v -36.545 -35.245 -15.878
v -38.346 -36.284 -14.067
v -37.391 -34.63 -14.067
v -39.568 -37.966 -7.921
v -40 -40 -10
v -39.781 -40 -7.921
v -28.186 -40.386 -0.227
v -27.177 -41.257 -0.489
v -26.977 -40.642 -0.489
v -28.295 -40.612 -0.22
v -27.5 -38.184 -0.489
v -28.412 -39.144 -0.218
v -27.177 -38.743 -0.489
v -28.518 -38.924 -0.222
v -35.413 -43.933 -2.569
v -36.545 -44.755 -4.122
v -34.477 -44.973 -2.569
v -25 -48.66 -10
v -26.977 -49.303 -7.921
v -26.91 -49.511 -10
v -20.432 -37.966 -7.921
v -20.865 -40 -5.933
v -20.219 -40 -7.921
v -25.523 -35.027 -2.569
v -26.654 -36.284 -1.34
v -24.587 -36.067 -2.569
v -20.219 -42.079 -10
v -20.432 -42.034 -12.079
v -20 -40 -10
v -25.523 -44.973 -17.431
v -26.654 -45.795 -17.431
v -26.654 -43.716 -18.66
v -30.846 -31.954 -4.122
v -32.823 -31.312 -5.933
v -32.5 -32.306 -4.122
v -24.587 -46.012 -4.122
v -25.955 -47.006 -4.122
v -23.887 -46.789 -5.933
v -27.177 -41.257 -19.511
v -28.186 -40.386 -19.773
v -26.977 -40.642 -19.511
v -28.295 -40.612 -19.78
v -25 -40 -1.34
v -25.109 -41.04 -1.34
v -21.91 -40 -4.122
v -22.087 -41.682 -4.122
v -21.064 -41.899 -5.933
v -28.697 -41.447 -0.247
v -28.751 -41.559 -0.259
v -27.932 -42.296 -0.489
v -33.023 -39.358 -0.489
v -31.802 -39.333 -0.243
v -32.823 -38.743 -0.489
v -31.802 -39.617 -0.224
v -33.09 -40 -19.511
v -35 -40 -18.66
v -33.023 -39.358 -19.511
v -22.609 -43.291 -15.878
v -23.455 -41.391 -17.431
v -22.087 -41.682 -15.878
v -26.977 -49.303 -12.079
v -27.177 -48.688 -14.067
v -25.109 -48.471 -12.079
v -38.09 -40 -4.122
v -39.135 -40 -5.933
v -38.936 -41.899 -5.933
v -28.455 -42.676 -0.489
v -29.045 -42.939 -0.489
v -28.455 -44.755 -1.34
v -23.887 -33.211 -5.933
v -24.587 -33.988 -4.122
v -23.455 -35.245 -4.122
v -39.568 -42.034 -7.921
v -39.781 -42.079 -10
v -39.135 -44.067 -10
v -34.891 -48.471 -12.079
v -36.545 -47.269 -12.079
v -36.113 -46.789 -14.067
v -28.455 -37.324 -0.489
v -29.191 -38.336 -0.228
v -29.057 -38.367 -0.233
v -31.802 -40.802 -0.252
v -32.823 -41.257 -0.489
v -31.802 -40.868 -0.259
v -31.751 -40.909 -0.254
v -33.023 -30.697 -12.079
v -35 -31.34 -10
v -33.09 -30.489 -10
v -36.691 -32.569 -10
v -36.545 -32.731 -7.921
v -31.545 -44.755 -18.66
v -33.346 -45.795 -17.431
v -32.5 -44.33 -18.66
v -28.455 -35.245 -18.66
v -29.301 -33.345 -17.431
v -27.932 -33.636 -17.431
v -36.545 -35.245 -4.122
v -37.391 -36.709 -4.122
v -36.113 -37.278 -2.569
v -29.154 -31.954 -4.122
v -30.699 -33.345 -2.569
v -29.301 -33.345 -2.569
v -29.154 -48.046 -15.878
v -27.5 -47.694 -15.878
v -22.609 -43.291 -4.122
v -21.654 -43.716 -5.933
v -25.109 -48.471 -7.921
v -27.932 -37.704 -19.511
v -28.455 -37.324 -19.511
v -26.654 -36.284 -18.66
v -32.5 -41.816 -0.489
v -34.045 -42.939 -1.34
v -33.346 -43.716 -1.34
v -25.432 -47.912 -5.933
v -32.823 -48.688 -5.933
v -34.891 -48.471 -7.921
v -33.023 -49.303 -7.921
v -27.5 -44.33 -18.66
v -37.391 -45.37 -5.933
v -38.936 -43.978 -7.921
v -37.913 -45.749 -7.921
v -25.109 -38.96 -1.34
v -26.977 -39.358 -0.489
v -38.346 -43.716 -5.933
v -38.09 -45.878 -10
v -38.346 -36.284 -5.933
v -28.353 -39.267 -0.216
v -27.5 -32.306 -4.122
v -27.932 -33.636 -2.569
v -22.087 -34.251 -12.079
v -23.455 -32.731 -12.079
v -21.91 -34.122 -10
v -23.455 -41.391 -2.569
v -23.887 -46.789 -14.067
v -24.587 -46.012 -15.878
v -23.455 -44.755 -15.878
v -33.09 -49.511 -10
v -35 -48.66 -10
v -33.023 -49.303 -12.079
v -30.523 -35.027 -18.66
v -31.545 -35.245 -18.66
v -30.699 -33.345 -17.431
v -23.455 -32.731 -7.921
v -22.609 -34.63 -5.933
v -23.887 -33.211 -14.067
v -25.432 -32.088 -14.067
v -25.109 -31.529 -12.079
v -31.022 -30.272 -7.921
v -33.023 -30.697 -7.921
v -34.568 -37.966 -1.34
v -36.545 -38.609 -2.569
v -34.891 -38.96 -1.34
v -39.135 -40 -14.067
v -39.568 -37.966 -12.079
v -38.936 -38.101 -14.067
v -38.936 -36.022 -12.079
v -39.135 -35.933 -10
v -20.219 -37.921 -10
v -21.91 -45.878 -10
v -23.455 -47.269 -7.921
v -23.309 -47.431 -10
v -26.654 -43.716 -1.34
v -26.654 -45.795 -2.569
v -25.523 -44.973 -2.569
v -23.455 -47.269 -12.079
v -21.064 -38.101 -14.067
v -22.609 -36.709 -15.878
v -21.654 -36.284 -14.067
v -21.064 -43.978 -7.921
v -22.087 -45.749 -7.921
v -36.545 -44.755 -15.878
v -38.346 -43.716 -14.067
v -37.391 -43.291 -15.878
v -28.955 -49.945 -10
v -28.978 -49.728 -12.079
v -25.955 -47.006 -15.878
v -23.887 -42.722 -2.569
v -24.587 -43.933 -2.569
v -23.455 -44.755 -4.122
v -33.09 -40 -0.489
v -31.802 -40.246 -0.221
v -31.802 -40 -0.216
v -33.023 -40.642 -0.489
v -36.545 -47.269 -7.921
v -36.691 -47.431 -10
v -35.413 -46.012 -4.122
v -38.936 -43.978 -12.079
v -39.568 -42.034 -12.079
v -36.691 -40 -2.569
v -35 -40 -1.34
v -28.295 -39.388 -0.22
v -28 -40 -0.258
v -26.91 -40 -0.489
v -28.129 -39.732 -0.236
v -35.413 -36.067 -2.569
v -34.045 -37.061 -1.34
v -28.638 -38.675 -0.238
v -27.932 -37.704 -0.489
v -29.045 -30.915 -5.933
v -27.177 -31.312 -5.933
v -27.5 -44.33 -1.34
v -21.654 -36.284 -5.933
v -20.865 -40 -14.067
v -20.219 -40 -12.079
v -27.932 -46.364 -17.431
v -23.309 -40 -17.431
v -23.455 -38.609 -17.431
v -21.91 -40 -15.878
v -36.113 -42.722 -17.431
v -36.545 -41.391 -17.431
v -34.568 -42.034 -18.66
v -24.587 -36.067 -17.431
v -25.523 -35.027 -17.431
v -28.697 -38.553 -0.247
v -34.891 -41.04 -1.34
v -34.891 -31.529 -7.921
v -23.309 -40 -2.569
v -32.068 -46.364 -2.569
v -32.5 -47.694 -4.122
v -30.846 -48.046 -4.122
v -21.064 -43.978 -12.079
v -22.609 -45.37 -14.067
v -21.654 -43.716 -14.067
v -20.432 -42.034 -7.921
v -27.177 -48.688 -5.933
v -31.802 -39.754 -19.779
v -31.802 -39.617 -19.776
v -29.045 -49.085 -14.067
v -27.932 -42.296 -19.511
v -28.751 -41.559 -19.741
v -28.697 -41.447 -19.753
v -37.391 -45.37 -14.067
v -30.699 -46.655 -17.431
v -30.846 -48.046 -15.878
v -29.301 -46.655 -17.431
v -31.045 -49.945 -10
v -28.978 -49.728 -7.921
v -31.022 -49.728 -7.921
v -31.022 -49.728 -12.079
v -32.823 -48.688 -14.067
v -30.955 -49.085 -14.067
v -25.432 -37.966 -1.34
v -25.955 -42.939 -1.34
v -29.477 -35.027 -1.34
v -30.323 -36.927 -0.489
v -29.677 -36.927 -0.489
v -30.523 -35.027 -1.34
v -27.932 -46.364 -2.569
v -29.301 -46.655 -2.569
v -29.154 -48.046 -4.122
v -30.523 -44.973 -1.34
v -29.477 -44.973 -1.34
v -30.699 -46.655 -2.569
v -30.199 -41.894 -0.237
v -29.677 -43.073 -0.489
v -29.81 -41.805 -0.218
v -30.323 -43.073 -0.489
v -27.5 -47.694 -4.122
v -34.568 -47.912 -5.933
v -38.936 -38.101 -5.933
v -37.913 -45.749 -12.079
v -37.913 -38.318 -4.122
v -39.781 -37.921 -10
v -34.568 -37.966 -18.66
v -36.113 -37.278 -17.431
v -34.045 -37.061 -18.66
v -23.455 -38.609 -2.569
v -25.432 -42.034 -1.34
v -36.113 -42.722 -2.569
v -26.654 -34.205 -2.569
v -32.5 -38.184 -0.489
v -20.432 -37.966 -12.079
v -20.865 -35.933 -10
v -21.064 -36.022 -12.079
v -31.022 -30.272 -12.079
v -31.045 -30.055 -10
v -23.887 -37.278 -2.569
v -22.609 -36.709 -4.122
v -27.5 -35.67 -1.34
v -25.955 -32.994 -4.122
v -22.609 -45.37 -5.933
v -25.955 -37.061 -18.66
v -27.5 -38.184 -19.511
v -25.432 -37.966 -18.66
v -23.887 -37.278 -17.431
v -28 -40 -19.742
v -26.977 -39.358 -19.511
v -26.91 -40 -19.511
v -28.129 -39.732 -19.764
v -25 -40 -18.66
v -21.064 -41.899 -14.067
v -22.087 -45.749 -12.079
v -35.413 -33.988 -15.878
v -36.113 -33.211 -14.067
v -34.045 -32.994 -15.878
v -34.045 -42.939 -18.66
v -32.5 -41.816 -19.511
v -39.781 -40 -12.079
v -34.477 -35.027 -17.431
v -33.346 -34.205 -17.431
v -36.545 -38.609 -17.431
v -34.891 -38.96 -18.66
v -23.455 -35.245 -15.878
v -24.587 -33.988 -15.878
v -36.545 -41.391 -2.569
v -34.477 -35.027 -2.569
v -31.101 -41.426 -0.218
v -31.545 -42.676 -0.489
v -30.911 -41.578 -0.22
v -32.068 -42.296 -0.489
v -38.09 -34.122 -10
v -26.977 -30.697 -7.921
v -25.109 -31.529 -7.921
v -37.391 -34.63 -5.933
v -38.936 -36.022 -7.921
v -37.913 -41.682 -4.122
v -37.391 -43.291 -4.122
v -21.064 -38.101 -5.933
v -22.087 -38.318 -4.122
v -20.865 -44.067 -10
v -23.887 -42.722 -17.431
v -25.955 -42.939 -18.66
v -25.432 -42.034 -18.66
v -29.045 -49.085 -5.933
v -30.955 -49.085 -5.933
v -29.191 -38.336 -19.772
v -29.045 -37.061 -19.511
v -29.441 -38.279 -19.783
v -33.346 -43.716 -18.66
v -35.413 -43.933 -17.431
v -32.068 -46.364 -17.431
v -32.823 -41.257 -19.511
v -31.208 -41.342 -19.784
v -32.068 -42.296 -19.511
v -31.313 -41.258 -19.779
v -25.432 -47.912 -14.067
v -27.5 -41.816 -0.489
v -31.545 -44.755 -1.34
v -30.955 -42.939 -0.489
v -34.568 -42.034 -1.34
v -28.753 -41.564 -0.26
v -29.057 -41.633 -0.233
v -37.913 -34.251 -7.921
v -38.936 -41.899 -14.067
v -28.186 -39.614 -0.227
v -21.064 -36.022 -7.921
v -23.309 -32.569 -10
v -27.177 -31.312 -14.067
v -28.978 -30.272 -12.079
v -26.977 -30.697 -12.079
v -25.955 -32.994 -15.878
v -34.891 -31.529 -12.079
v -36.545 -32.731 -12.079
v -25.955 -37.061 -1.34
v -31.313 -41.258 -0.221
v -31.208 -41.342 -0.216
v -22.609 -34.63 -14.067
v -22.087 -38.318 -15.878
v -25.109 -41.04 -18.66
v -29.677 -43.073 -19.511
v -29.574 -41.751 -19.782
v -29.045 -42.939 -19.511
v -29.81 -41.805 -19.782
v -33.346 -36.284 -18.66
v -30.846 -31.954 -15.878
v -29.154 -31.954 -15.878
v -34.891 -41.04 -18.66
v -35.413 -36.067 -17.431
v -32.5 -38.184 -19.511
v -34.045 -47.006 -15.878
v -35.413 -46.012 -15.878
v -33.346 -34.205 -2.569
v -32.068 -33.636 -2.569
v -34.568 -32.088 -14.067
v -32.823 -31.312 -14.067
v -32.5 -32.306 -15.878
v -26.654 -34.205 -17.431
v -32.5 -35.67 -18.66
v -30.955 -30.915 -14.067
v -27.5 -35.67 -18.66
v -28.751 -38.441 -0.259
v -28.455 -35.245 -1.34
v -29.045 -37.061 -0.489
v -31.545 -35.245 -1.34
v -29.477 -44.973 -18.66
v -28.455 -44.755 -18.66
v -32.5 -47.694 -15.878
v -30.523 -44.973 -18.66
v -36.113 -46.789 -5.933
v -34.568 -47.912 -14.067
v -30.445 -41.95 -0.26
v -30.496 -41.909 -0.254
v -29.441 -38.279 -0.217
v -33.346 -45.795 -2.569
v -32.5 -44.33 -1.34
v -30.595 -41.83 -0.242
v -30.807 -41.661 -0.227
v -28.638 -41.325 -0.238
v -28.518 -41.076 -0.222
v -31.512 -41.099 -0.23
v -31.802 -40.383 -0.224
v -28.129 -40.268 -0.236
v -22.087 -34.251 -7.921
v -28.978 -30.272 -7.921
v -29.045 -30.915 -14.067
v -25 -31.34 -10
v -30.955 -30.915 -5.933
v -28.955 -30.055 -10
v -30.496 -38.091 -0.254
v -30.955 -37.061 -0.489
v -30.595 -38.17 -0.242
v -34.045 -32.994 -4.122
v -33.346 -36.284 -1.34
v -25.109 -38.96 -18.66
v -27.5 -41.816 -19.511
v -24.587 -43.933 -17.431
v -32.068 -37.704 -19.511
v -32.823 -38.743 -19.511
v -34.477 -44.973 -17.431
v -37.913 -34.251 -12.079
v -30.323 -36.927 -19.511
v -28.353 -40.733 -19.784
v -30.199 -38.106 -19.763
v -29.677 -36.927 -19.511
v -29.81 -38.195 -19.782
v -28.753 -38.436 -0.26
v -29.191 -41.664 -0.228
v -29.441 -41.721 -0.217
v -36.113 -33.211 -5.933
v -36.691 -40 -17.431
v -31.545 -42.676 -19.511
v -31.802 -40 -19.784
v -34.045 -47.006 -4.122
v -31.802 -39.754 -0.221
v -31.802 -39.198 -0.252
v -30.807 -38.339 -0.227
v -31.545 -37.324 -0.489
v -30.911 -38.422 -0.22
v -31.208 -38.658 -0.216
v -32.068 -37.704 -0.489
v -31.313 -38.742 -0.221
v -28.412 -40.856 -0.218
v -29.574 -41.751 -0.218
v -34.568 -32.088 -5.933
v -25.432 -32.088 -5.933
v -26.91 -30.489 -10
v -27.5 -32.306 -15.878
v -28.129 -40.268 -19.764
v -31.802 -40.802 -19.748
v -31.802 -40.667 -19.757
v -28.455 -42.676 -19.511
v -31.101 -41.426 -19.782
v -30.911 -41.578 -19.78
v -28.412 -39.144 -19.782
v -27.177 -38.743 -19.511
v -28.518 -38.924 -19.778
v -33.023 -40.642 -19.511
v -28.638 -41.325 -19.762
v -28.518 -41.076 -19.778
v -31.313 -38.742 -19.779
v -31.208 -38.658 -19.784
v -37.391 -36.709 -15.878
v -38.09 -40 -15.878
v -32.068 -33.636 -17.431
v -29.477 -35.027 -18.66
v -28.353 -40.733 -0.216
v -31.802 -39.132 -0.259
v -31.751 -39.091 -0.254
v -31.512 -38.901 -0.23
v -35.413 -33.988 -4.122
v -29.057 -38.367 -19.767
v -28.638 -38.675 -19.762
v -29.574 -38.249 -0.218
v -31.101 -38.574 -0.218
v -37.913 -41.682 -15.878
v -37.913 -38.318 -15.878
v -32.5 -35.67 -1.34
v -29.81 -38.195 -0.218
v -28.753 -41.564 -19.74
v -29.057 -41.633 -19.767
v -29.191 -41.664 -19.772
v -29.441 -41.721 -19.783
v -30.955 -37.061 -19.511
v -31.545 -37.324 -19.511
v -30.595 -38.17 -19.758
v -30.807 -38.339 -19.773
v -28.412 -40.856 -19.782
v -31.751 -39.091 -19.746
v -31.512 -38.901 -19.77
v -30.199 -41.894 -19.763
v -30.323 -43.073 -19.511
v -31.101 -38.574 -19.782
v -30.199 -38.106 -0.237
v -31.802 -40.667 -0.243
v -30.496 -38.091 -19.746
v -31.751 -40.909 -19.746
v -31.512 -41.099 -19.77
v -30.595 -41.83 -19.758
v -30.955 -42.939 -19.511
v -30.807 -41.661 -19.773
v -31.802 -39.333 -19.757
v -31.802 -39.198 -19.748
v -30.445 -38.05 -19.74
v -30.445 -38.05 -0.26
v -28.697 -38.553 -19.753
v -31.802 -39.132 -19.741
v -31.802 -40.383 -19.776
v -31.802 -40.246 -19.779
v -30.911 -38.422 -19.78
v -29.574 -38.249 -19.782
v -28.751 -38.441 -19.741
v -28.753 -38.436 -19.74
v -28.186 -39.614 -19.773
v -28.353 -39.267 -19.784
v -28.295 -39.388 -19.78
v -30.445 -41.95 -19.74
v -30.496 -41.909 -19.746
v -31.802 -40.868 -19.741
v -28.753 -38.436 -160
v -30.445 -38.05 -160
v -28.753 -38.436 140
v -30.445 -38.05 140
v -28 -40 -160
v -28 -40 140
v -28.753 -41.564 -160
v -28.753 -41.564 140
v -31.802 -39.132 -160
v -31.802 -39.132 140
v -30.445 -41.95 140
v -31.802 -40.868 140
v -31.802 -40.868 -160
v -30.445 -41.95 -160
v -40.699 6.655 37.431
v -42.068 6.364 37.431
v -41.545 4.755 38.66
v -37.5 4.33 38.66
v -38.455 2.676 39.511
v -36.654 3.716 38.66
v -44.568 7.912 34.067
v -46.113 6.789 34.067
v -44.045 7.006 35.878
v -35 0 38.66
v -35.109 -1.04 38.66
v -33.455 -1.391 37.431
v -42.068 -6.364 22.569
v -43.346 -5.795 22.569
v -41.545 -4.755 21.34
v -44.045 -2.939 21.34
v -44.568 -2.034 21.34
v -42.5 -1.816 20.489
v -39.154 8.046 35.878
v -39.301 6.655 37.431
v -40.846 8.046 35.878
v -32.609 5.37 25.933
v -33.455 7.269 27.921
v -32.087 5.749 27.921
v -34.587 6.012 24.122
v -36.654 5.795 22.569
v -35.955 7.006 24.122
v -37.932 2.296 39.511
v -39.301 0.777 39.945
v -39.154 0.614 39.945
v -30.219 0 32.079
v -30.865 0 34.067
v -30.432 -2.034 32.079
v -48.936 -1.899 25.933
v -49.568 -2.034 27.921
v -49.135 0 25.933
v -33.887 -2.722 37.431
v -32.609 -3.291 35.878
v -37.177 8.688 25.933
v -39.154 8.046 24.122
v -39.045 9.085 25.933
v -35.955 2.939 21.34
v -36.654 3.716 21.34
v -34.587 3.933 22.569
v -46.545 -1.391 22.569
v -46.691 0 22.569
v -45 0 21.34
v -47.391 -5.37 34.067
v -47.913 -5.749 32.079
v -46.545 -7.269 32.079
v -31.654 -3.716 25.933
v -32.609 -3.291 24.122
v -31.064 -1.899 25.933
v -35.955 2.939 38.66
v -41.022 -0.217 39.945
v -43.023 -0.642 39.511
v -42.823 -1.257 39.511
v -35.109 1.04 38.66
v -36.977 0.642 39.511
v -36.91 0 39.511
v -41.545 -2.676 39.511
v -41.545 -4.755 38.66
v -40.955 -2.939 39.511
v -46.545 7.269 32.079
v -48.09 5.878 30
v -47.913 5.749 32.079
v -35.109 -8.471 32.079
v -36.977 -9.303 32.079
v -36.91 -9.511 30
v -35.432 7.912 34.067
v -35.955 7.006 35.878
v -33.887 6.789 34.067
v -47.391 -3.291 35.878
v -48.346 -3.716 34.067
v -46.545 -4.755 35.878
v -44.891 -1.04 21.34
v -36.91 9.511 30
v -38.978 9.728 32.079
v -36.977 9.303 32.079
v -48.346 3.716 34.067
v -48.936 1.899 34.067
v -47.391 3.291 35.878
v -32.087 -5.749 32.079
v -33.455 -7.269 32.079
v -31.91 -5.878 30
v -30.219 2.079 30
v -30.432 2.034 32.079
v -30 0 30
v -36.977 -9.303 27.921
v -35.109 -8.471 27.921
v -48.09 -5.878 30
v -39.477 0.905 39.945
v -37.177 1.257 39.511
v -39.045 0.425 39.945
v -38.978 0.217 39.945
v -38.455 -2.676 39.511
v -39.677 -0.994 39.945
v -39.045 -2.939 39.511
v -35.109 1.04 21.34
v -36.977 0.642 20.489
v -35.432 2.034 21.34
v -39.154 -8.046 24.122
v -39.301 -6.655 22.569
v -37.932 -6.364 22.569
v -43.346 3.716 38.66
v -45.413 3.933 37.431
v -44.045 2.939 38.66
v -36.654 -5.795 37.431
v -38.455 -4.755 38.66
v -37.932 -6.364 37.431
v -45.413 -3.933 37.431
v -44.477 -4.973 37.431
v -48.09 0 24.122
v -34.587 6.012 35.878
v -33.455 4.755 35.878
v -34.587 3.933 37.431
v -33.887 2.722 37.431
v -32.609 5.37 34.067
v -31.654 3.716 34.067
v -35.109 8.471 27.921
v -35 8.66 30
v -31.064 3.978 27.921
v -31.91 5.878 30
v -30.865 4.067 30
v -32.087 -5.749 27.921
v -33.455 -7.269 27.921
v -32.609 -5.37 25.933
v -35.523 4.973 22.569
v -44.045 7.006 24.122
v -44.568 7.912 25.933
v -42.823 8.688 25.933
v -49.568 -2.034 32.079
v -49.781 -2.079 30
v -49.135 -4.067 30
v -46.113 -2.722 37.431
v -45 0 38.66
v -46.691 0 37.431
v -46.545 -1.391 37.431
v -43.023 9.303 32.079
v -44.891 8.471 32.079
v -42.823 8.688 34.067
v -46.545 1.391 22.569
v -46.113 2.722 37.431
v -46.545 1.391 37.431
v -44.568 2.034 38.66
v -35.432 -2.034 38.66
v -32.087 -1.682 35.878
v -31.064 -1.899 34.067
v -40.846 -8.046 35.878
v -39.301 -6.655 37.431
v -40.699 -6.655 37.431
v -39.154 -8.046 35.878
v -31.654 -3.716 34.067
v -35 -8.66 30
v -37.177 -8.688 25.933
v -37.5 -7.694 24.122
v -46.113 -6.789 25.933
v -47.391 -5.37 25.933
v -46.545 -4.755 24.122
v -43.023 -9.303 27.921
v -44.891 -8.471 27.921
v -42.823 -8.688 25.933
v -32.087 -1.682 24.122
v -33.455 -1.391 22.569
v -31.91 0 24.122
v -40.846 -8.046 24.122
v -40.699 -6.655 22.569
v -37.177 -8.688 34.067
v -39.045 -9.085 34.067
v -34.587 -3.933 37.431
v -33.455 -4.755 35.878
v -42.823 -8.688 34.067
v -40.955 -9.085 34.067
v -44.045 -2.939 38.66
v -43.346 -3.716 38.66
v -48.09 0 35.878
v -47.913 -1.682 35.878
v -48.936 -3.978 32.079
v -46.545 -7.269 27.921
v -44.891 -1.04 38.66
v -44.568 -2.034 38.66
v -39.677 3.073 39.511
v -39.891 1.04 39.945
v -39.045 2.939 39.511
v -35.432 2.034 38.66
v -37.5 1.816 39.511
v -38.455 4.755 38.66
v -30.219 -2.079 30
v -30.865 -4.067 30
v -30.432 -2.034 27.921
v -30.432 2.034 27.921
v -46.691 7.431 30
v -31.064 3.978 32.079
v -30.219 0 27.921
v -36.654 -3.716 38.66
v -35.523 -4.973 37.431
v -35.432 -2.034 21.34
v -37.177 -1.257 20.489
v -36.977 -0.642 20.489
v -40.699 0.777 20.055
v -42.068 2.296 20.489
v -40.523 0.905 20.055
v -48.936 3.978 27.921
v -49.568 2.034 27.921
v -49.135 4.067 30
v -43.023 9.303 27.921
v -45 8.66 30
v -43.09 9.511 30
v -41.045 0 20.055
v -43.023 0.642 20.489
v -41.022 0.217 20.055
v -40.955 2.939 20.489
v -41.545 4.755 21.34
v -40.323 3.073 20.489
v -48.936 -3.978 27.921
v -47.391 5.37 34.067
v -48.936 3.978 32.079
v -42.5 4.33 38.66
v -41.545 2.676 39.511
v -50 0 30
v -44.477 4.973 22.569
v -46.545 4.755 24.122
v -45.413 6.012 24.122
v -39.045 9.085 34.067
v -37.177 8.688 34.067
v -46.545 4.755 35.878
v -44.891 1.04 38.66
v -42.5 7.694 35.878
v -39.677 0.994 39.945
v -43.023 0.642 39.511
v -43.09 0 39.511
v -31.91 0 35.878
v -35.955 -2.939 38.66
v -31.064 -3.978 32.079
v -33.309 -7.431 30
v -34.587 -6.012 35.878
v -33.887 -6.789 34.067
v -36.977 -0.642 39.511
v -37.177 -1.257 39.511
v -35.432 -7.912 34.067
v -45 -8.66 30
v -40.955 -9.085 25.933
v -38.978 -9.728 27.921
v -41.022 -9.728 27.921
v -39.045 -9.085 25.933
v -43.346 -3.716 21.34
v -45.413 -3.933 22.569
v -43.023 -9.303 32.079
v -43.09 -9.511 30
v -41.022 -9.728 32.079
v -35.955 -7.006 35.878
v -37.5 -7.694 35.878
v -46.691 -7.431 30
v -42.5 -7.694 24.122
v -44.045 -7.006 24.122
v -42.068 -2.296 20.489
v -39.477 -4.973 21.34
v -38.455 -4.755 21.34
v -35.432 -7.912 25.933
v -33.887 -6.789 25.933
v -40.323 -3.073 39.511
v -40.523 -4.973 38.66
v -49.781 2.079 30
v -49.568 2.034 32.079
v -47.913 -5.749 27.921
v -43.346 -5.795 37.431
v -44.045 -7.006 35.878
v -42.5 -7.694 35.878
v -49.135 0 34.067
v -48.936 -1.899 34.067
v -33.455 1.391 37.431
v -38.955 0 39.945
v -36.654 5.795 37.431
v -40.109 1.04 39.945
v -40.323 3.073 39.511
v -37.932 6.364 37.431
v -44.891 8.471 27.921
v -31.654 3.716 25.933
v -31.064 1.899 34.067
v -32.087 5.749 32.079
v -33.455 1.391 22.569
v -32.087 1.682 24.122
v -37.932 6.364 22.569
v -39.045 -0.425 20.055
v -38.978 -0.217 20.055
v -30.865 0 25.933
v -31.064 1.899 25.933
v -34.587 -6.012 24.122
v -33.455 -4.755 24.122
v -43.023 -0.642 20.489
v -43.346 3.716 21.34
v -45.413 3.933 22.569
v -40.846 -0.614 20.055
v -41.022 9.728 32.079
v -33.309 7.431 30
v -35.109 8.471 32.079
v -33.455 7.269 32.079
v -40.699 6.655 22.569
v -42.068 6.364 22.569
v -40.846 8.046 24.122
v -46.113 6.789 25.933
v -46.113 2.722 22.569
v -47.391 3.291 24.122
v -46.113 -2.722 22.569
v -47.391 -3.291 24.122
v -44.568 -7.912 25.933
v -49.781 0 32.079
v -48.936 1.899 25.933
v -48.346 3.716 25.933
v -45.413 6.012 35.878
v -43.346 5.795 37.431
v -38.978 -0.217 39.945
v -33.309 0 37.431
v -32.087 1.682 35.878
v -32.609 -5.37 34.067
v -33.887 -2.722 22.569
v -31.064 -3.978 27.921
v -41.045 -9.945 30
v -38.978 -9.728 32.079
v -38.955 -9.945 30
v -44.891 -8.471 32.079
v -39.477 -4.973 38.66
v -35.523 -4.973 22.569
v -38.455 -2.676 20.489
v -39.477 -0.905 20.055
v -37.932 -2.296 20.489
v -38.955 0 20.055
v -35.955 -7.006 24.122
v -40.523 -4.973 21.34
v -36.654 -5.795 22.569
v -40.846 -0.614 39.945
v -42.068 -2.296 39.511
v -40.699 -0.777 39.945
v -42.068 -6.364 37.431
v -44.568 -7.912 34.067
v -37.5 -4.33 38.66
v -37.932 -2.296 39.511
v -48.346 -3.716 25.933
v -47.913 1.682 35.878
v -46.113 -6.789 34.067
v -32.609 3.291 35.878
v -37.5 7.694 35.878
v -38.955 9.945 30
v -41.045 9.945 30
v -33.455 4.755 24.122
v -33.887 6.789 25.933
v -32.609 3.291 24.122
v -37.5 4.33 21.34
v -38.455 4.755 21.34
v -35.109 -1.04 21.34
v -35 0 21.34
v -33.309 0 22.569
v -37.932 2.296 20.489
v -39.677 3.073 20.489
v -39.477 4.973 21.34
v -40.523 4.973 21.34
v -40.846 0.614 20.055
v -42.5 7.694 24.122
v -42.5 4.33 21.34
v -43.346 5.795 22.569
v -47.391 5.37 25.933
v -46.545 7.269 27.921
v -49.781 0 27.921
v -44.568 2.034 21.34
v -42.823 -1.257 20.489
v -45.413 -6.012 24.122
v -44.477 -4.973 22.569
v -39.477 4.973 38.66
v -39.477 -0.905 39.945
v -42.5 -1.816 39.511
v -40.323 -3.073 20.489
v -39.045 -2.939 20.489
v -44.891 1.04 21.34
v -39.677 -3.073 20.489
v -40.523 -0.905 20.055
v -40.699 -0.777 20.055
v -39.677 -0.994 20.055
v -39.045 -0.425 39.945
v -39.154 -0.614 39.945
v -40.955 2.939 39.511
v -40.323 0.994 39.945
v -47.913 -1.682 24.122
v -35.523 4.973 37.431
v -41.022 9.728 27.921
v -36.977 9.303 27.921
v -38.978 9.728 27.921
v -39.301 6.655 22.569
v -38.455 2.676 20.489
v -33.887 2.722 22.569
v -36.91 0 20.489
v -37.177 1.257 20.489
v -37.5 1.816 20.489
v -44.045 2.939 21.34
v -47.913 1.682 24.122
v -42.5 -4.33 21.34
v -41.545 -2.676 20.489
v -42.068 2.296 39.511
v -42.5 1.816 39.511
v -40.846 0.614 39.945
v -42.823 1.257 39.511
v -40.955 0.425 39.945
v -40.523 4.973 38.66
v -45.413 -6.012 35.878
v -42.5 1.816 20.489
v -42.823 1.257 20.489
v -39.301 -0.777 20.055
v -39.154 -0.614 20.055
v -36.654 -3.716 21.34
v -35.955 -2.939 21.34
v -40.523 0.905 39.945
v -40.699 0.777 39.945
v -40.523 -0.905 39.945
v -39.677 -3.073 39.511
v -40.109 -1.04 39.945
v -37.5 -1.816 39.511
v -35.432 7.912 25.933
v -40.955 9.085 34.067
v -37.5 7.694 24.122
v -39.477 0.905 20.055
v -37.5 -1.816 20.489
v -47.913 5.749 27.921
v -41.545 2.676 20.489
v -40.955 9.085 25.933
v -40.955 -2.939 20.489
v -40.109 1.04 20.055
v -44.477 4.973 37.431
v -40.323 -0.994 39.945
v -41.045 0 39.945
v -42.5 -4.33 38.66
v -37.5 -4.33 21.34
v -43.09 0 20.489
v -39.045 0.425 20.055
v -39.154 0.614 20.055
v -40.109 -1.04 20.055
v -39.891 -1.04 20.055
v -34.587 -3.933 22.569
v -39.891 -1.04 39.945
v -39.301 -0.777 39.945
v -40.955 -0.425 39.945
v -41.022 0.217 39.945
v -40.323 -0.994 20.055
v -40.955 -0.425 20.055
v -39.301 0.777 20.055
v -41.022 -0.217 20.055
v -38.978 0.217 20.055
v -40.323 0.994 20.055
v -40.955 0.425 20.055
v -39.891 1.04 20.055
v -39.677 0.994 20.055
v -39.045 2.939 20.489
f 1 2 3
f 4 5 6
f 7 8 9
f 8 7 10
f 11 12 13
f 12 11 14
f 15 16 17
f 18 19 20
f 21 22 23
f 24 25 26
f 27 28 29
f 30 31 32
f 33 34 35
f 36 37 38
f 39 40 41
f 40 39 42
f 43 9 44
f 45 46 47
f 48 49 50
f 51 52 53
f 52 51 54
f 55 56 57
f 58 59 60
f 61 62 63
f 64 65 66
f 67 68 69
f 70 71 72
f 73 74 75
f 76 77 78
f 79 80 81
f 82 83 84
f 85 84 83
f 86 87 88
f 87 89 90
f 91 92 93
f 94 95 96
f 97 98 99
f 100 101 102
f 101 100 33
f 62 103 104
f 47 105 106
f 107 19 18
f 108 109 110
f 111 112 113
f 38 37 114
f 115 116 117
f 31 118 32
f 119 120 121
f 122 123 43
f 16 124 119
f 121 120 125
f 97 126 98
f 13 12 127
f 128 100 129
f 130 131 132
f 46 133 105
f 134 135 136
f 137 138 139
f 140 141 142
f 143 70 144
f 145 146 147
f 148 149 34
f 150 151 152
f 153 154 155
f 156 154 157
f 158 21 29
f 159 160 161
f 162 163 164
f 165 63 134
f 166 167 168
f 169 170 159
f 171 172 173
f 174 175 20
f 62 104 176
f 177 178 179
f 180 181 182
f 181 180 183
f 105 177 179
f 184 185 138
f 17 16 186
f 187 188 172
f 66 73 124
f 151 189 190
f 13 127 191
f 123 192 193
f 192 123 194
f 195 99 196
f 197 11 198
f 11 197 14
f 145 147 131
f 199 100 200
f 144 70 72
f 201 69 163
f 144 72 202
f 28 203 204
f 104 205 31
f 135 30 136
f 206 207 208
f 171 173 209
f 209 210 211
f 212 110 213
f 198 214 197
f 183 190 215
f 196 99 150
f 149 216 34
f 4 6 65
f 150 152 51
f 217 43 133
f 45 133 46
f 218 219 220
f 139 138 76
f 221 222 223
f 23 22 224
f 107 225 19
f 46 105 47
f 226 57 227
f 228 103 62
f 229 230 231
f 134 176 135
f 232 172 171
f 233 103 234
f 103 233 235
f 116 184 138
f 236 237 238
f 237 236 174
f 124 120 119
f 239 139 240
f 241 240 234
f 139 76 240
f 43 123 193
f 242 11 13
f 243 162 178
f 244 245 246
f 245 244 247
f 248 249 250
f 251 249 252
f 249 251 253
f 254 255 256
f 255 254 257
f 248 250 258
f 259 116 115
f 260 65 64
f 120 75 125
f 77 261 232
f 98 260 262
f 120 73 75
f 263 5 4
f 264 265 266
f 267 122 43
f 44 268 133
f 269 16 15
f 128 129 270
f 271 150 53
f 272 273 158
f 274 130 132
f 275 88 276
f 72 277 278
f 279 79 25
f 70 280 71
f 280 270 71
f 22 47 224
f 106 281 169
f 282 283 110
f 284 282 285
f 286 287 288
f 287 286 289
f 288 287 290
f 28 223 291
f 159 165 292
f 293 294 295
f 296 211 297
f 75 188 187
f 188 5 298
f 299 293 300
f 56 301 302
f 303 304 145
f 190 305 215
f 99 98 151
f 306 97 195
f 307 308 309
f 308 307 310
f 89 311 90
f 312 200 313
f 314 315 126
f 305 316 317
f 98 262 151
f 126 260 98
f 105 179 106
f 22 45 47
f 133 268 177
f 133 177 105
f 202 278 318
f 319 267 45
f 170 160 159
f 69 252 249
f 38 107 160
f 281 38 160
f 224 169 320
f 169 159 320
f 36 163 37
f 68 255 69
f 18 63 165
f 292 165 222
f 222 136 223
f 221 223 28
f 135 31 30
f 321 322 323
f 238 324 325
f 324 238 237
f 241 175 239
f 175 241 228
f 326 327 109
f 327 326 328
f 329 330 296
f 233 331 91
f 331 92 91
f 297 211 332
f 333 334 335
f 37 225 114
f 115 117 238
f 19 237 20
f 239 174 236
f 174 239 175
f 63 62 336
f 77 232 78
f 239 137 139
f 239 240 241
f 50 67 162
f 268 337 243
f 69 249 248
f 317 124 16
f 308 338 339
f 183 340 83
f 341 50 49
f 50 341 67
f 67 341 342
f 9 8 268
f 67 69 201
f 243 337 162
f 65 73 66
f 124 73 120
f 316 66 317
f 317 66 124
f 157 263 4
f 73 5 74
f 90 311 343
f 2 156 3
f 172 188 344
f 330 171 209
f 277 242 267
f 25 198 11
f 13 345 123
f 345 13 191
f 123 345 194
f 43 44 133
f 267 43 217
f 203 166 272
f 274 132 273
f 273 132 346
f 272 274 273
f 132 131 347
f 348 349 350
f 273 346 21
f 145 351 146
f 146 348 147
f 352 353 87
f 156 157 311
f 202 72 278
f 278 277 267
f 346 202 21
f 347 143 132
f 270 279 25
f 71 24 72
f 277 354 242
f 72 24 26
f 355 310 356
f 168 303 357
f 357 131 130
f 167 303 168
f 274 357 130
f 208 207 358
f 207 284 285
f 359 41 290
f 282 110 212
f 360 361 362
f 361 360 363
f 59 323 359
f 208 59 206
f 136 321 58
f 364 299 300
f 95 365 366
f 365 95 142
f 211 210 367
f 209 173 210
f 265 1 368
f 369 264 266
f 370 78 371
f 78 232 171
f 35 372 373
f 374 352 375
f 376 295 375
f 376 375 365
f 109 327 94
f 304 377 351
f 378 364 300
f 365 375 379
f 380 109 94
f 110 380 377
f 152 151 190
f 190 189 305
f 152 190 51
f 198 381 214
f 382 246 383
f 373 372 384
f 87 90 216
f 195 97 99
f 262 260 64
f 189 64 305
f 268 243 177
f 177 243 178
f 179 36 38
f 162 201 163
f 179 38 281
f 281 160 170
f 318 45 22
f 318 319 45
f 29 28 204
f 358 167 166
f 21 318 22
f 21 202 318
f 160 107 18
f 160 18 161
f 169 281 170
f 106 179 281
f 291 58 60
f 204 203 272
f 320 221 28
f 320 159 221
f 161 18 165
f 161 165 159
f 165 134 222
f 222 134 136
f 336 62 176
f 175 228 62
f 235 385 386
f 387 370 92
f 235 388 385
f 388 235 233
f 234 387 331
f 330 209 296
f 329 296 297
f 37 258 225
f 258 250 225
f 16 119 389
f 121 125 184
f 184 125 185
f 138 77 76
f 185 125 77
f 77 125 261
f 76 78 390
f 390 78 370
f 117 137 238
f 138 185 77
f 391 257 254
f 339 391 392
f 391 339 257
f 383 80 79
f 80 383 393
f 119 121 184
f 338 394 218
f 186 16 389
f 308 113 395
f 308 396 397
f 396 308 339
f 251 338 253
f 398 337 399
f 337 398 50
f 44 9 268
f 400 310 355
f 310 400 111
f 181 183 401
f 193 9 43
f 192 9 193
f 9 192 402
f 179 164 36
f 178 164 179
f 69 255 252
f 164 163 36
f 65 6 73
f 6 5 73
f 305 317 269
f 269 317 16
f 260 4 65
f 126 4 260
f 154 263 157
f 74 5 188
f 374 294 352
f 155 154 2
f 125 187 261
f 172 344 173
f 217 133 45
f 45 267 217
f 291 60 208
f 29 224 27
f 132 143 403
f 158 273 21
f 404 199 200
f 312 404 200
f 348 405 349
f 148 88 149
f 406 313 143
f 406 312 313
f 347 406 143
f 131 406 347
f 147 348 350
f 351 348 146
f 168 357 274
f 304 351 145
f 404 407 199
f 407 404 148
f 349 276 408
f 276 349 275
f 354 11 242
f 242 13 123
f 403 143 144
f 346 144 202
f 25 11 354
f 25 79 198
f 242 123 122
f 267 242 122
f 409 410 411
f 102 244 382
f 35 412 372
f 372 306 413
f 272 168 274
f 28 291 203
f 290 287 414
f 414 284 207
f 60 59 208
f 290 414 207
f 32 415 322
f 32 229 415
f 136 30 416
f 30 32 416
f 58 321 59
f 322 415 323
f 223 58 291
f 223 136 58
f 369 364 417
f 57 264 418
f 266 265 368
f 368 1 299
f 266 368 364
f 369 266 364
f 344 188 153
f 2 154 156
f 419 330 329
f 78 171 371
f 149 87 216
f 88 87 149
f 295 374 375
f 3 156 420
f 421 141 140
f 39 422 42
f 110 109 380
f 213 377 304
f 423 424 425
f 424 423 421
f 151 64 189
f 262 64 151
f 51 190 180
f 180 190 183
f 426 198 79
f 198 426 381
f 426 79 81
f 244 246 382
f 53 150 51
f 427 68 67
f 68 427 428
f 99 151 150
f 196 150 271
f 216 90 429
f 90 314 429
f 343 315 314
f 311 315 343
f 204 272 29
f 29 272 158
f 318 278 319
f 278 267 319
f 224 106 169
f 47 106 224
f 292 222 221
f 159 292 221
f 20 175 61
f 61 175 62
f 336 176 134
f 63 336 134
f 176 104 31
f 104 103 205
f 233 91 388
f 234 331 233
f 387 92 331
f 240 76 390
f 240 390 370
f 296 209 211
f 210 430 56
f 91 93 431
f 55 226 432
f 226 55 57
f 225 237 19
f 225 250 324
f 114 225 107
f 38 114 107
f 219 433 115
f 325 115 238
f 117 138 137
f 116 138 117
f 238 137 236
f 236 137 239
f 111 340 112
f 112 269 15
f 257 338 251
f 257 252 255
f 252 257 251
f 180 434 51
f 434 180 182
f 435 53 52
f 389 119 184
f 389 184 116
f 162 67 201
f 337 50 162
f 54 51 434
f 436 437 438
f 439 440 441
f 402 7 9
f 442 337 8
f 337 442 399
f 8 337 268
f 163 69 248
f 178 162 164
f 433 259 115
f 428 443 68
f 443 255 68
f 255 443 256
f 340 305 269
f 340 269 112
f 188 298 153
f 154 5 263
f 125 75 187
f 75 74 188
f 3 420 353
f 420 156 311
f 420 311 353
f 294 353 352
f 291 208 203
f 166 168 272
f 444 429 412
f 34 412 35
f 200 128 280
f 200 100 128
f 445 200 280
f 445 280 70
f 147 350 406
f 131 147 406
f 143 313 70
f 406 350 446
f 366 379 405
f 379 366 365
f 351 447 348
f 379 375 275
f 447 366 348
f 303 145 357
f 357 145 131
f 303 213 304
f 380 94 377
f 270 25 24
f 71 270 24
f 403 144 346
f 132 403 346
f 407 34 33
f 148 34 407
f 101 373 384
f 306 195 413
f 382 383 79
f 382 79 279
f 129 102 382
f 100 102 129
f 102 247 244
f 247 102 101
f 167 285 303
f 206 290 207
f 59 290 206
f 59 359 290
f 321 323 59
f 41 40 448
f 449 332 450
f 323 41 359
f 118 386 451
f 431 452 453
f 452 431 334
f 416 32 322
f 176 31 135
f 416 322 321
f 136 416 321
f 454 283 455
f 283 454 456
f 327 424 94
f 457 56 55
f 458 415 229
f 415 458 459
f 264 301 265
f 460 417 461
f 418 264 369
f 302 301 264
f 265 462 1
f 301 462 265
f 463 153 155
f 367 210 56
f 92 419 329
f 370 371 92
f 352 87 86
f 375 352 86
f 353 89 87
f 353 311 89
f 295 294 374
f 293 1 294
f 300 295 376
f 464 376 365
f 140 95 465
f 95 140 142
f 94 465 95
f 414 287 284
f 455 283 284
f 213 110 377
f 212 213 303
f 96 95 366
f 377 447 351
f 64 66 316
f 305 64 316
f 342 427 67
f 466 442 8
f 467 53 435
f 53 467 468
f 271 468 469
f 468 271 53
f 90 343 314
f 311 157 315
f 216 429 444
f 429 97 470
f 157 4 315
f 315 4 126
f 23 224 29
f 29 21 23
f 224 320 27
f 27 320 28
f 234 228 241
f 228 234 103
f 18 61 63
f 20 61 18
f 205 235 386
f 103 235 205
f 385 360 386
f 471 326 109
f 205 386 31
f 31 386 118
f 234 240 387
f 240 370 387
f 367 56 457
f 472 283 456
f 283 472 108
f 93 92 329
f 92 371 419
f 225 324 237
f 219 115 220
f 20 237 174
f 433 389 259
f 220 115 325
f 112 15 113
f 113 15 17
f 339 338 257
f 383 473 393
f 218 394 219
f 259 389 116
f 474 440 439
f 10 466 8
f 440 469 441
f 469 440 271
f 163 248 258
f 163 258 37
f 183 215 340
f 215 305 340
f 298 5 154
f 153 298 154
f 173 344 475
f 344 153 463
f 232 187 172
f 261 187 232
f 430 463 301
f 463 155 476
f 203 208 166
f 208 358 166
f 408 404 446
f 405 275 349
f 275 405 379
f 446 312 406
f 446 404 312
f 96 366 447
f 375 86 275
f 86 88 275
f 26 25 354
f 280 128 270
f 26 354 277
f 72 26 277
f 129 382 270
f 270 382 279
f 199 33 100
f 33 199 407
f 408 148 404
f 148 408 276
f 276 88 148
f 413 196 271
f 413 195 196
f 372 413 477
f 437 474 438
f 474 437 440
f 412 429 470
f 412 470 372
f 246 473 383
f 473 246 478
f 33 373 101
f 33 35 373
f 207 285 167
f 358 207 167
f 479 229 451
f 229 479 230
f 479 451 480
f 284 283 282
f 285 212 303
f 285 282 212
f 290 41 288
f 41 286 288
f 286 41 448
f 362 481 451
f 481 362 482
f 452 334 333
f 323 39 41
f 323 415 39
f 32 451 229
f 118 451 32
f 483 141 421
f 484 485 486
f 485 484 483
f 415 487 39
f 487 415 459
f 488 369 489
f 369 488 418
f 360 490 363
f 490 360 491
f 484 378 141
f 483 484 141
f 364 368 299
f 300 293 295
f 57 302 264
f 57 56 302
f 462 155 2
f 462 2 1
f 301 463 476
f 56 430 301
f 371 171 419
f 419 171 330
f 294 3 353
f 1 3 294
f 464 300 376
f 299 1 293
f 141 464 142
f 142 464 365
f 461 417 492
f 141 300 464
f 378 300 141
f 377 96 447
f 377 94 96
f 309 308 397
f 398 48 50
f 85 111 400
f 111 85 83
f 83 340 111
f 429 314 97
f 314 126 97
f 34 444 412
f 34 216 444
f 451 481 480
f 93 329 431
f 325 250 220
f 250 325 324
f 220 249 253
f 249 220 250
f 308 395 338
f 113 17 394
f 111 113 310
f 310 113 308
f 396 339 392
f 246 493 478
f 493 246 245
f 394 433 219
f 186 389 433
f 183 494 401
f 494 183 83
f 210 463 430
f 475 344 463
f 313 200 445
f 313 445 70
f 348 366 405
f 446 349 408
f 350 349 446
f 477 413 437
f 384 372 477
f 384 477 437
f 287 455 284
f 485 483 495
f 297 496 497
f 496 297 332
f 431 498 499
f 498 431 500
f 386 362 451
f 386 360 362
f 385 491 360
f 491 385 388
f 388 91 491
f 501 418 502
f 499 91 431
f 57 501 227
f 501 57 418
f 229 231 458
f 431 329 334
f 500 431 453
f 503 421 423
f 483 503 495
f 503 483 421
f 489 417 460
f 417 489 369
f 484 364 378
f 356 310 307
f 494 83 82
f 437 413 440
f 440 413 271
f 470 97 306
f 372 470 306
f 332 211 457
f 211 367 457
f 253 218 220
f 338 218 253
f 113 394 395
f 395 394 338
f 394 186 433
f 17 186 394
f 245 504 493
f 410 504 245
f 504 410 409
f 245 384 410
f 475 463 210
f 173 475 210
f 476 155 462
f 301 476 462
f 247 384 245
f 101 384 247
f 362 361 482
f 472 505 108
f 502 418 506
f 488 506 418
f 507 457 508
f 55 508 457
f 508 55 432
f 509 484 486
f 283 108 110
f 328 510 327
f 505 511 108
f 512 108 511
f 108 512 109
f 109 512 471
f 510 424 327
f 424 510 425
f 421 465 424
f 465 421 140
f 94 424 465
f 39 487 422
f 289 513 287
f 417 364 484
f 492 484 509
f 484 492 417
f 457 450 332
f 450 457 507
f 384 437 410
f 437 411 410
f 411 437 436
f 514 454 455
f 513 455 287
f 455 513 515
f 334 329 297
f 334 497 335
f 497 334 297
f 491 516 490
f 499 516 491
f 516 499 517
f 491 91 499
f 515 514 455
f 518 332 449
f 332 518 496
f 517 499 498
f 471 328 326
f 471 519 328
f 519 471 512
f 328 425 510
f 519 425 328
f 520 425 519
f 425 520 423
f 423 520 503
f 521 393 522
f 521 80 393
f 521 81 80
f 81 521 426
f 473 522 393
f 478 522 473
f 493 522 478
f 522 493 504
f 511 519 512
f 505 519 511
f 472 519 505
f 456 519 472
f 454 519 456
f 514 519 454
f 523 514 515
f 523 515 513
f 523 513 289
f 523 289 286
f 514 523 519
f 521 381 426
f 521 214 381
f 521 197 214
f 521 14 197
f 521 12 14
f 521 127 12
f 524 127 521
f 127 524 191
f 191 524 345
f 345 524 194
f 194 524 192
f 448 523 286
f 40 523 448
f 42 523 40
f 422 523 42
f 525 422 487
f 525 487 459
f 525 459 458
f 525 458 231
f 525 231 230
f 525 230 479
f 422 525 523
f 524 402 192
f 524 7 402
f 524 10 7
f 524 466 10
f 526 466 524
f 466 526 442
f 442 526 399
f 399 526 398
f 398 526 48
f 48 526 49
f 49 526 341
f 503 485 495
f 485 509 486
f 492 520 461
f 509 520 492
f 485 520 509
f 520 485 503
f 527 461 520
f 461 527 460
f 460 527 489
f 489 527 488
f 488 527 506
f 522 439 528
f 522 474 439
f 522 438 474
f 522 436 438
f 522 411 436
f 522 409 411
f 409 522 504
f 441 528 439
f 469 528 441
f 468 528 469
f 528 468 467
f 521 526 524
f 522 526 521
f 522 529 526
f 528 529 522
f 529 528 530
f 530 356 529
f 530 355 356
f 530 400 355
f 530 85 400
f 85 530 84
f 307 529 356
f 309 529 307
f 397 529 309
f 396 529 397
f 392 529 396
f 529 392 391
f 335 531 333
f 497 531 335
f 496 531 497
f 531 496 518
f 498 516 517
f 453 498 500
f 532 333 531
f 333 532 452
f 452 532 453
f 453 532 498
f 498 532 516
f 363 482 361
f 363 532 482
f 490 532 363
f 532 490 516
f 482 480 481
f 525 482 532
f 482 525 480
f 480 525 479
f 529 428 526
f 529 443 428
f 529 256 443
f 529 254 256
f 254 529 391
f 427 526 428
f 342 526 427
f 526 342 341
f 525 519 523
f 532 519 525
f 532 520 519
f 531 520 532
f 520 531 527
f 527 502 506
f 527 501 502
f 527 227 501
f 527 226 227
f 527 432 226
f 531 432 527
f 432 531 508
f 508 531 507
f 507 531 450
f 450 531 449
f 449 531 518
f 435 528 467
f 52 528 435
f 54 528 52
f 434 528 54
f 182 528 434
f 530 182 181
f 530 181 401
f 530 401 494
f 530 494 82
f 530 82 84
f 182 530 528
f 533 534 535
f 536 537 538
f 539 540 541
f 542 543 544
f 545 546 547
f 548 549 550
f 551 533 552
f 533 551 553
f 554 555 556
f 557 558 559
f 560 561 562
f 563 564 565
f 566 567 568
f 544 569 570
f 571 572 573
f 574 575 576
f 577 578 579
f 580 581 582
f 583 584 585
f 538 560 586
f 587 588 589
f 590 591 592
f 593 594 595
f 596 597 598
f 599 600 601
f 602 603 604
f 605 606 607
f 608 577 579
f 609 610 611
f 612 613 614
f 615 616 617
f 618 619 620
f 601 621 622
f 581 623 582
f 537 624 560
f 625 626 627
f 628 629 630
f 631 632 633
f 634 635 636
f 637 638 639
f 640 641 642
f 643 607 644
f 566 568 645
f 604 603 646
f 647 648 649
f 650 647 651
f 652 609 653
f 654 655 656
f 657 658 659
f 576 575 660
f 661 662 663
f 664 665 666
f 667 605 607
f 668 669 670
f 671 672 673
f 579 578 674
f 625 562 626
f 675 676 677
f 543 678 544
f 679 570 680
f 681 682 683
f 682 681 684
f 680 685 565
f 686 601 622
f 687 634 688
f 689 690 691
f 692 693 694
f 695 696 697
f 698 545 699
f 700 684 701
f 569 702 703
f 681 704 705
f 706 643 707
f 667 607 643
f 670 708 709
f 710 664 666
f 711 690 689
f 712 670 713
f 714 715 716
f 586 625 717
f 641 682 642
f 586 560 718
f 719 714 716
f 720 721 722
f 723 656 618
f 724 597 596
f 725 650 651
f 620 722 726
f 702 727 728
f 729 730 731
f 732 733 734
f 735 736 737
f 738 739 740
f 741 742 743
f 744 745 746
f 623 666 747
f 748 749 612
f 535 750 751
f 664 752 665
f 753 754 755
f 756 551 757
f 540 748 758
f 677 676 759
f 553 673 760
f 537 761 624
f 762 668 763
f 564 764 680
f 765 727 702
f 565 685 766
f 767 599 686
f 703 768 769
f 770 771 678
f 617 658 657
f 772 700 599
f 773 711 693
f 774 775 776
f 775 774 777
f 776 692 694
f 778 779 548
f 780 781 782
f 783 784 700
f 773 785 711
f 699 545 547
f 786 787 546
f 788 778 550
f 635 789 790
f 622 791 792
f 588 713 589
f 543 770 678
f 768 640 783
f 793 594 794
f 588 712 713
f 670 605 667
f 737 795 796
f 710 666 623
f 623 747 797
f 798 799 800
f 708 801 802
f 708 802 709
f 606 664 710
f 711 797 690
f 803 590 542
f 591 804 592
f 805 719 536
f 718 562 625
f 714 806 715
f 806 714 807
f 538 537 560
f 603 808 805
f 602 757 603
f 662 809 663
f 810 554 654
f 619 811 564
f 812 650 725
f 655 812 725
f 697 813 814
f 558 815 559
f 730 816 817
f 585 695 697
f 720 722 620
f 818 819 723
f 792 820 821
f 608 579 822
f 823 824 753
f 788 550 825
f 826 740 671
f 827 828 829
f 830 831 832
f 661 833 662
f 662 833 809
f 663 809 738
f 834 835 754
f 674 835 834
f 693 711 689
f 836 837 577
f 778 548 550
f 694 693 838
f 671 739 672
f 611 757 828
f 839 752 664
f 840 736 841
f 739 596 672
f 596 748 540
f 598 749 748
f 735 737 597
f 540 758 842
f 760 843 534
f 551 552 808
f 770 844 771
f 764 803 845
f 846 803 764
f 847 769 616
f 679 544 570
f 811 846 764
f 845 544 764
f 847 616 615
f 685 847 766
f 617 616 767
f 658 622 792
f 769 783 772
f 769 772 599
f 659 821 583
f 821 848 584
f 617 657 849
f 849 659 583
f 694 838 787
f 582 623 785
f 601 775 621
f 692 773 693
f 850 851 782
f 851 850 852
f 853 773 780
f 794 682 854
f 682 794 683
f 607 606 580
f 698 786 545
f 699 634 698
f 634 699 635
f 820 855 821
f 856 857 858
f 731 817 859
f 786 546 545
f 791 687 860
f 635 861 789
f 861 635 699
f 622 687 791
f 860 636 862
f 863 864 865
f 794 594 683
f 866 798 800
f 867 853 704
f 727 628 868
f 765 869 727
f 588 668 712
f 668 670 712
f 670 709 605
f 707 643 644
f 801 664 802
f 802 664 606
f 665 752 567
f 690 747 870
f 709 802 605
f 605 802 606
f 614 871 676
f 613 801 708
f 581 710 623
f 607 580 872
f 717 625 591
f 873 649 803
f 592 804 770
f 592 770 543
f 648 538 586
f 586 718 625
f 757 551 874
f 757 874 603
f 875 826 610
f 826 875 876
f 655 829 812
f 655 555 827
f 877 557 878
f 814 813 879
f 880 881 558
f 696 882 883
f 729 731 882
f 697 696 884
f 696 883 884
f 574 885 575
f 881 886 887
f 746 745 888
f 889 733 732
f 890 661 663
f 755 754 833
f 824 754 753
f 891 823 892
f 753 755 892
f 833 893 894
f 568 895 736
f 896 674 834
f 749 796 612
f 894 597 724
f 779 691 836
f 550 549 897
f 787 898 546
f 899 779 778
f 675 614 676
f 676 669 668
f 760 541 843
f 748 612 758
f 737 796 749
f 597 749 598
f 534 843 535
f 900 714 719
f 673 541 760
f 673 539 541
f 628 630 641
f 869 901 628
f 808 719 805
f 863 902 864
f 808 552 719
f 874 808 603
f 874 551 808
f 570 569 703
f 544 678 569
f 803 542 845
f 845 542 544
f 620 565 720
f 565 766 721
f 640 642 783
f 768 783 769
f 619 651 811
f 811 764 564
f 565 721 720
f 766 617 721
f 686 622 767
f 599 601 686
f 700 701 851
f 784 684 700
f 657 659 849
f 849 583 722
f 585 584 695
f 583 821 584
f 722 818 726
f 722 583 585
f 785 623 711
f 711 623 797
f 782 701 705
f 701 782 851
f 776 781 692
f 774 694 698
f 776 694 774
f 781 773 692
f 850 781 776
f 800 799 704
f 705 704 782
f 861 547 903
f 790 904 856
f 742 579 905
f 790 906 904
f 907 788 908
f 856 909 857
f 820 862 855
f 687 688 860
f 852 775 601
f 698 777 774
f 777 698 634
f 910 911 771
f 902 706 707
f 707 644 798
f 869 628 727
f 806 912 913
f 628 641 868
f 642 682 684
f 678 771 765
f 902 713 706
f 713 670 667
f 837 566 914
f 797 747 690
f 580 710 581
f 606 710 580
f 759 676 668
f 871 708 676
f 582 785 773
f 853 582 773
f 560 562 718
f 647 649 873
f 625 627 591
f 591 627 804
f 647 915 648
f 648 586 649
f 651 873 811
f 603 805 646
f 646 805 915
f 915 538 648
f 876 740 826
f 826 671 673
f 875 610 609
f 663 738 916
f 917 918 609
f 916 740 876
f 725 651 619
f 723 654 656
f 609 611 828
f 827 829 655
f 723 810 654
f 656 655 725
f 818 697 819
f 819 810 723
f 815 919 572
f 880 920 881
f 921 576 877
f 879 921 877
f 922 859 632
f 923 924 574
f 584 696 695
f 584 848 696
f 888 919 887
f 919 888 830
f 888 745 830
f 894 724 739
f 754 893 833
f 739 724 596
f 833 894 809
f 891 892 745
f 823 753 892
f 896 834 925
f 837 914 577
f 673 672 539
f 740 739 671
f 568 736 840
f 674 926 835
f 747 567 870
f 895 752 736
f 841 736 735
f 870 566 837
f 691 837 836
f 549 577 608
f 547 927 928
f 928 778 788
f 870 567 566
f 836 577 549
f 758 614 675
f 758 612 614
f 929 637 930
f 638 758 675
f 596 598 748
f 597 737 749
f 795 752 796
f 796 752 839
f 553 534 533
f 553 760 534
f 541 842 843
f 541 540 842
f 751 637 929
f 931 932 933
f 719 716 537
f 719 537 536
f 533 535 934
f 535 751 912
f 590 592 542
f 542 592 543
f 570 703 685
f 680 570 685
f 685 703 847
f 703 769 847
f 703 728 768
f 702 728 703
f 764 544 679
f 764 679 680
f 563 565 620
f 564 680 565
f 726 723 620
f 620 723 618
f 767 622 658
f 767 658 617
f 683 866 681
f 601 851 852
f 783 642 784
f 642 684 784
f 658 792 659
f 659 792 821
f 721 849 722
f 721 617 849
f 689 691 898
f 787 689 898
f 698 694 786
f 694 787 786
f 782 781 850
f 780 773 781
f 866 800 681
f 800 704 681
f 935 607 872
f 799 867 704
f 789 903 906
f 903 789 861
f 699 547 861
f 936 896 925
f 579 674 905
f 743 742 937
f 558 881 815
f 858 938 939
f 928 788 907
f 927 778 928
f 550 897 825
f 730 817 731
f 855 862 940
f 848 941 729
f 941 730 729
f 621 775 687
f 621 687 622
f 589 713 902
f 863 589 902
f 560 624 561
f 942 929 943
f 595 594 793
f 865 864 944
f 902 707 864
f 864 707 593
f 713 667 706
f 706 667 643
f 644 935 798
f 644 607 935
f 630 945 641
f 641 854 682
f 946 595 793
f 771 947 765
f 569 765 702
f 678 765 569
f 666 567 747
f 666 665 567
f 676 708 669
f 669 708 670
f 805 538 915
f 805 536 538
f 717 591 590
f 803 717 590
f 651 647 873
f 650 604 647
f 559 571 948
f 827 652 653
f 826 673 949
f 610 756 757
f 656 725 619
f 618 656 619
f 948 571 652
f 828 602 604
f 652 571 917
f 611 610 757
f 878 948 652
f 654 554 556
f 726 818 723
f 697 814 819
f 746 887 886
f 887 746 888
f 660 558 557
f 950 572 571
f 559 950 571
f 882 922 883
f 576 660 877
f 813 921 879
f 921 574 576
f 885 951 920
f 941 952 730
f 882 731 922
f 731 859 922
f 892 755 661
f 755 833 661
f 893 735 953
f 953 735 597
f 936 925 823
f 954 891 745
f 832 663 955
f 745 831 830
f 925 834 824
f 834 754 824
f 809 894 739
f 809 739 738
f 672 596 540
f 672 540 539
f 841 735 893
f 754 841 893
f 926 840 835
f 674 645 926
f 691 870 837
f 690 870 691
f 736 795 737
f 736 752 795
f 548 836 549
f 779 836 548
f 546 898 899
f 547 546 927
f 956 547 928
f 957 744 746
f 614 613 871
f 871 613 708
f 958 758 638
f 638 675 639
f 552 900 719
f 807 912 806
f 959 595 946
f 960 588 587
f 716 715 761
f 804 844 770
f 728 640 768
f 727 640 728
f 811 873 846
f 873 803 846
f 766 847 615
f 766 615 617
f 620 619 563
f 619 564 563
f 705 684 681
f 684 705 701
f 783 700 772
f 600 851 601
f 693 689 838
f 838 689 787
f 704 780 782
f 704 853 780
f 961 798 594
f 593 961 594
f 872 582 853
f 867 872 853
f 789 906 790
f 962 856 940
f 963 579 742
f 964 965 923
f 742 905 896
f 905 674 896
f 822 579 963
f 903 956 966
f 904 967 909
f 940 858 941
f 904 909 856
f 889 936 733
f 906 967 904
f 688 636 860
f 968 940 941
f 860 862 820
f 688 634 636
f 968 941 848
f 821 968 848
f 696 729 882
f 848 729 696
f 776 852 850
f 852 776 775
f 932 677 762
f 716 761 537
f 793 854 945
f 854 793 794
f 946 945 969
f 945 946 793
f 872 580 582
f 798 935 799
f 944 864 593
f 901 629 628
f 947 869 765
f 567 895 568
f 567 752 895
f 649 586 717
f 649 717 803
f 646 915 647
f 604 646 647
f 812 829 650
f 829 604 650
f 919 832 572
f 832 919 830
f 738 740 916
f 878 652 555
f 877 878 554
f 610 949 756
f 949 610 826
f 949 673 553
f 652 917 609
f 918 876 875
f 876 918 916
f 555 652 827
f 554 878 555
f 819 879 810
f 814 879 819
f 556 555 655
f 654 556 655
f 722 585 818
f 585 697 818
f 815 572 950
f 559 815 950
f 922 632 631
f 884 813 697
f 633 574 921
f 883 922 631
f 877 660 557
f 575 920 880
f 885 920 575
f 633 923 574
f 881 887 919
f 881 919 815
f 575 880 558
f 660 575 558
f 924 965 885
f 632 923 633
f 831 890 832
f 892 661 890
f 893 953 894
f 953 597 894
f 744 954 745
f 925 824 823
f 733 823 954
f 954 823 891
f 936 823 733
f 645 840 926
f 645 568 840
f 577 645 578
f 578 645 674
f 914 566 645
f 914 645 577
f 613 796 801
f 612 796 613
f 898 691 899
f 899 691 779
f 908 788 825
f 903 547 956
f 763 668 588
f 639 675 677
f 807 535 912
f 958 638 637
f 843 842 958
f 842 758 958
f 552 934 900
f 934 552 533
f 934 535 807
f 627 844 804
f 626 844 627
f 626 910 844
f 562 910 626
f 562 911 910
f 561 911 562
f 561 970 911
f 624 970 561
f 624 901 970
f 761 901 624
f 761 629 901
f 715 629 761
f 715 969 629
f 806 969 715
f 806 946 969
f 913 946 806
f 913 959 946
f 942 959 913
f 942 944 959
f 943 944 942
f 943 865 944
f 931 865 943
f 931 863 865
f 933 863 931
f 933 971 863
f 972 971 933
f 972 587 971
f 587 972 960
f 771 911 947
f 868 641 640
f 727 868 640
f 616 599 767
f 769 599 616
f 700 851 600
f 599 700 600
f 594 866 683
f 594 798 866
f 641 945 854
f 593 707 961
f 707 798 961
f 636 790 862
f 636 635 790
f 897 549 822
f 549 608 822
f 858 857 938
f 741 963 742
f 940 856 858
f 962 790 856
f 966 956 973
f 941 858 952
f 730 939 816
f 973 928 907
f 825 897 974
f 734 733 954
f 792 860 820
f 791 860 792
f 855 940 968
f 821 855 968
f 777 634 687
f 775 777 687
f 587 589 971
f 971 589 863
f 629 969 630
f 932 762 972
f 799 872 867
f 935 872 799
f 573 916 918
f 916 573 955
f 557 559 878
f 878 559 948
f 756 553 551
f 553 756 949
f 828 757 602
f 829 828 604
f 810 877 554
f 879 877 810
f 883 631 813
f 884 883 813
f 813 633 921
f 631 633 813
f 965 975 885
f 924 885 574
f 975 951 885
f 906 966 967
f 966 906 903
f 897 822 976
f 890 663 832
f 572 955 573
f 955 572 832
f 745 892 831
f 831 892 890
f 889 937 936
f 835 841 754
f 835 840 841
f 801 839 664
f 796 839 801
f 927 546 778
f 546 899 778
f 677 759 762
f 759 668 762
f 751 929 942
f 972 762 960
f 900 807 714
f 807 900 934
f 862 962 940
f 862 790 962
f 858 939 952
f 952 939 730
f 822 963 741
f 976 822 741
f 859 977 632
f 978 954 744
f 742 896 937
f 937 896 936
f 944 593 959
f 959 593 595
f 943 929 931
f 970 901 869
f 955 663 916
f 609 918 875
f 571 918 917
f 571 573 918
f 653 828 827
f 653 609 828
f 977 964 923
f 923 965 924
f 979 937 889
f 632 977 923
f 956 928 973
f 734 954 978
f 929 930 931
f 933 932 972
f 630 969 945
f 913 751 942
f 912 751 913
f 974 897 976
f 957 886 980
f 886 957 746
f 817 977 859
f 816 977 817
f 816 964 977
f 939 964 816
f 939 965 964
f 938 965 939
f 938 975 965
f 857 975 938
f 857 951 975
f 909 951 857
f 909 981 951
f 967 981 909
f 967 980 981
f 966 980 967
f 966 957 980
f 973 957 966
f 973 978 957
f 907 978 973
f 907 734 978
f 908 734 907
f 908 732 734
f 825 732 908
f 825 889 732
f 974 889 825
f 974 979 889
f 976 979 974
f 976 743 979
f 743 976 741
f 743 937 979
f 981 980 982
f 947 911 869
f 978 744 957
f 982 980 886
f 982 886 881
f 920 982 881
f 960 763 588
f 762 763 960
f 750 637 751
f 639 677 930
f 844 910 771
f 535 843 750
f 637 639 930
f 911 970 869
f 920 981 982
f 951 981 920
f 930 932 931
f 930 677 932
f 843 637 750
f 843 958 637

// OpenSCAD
// This indicates the pin (revolute) joint.
// 
// The revolute is generically modeled as
// a coincident point and parallel constraint.


// in-plane constraint

translate([-40,0,30]){
  color("red", 0.5)
    sphere(10);
  rotate(25, [0,1,2])
    color("blue", 0.4)
      square([300, 300], true);
}

// parallel-axis constraint

color("red", 0.5){
translate([50,0,50])
  rotate([5,40,0])
    square([300,300], true);
}

color("blue", 0.5){
translate([0,10,50])
  rotate([5,40,0])
    square([300,300], true);
}
// application of these two constraints 
// results in t2-r1 DoF for the two components
// (one component fixed).

// You can see that the red component
// is free to move the point in translation 
// along the blue plane.
// red can also rotate about an axis
// perpendicular to the red plane but not
// about the non-parallel plane.

// in-line constraint

translate([-30, -40, -10]) {
color("blue", 0.5){
translate([0,0,0])
  rotate([0,0,0])
    sphere(10);
}

color("red", 0.5){
translate([0,0,0])
  rotate([0,0,0])
    cylinder(300, 2, 2, true);
} }

// Consider blue to be stationary and red mobile.
// For a moment, ignore the in-line constraint.
// red can slide (translate) on the blue plane and
// rotate about the axis perpendicular to the 
// parallel planes and passing through the red point.
// Adding the in-line constraint results in the
// red line tracing out a hour-glass surface.
// The blue point must remain on this line as red
// revolves on its axis. 

 
